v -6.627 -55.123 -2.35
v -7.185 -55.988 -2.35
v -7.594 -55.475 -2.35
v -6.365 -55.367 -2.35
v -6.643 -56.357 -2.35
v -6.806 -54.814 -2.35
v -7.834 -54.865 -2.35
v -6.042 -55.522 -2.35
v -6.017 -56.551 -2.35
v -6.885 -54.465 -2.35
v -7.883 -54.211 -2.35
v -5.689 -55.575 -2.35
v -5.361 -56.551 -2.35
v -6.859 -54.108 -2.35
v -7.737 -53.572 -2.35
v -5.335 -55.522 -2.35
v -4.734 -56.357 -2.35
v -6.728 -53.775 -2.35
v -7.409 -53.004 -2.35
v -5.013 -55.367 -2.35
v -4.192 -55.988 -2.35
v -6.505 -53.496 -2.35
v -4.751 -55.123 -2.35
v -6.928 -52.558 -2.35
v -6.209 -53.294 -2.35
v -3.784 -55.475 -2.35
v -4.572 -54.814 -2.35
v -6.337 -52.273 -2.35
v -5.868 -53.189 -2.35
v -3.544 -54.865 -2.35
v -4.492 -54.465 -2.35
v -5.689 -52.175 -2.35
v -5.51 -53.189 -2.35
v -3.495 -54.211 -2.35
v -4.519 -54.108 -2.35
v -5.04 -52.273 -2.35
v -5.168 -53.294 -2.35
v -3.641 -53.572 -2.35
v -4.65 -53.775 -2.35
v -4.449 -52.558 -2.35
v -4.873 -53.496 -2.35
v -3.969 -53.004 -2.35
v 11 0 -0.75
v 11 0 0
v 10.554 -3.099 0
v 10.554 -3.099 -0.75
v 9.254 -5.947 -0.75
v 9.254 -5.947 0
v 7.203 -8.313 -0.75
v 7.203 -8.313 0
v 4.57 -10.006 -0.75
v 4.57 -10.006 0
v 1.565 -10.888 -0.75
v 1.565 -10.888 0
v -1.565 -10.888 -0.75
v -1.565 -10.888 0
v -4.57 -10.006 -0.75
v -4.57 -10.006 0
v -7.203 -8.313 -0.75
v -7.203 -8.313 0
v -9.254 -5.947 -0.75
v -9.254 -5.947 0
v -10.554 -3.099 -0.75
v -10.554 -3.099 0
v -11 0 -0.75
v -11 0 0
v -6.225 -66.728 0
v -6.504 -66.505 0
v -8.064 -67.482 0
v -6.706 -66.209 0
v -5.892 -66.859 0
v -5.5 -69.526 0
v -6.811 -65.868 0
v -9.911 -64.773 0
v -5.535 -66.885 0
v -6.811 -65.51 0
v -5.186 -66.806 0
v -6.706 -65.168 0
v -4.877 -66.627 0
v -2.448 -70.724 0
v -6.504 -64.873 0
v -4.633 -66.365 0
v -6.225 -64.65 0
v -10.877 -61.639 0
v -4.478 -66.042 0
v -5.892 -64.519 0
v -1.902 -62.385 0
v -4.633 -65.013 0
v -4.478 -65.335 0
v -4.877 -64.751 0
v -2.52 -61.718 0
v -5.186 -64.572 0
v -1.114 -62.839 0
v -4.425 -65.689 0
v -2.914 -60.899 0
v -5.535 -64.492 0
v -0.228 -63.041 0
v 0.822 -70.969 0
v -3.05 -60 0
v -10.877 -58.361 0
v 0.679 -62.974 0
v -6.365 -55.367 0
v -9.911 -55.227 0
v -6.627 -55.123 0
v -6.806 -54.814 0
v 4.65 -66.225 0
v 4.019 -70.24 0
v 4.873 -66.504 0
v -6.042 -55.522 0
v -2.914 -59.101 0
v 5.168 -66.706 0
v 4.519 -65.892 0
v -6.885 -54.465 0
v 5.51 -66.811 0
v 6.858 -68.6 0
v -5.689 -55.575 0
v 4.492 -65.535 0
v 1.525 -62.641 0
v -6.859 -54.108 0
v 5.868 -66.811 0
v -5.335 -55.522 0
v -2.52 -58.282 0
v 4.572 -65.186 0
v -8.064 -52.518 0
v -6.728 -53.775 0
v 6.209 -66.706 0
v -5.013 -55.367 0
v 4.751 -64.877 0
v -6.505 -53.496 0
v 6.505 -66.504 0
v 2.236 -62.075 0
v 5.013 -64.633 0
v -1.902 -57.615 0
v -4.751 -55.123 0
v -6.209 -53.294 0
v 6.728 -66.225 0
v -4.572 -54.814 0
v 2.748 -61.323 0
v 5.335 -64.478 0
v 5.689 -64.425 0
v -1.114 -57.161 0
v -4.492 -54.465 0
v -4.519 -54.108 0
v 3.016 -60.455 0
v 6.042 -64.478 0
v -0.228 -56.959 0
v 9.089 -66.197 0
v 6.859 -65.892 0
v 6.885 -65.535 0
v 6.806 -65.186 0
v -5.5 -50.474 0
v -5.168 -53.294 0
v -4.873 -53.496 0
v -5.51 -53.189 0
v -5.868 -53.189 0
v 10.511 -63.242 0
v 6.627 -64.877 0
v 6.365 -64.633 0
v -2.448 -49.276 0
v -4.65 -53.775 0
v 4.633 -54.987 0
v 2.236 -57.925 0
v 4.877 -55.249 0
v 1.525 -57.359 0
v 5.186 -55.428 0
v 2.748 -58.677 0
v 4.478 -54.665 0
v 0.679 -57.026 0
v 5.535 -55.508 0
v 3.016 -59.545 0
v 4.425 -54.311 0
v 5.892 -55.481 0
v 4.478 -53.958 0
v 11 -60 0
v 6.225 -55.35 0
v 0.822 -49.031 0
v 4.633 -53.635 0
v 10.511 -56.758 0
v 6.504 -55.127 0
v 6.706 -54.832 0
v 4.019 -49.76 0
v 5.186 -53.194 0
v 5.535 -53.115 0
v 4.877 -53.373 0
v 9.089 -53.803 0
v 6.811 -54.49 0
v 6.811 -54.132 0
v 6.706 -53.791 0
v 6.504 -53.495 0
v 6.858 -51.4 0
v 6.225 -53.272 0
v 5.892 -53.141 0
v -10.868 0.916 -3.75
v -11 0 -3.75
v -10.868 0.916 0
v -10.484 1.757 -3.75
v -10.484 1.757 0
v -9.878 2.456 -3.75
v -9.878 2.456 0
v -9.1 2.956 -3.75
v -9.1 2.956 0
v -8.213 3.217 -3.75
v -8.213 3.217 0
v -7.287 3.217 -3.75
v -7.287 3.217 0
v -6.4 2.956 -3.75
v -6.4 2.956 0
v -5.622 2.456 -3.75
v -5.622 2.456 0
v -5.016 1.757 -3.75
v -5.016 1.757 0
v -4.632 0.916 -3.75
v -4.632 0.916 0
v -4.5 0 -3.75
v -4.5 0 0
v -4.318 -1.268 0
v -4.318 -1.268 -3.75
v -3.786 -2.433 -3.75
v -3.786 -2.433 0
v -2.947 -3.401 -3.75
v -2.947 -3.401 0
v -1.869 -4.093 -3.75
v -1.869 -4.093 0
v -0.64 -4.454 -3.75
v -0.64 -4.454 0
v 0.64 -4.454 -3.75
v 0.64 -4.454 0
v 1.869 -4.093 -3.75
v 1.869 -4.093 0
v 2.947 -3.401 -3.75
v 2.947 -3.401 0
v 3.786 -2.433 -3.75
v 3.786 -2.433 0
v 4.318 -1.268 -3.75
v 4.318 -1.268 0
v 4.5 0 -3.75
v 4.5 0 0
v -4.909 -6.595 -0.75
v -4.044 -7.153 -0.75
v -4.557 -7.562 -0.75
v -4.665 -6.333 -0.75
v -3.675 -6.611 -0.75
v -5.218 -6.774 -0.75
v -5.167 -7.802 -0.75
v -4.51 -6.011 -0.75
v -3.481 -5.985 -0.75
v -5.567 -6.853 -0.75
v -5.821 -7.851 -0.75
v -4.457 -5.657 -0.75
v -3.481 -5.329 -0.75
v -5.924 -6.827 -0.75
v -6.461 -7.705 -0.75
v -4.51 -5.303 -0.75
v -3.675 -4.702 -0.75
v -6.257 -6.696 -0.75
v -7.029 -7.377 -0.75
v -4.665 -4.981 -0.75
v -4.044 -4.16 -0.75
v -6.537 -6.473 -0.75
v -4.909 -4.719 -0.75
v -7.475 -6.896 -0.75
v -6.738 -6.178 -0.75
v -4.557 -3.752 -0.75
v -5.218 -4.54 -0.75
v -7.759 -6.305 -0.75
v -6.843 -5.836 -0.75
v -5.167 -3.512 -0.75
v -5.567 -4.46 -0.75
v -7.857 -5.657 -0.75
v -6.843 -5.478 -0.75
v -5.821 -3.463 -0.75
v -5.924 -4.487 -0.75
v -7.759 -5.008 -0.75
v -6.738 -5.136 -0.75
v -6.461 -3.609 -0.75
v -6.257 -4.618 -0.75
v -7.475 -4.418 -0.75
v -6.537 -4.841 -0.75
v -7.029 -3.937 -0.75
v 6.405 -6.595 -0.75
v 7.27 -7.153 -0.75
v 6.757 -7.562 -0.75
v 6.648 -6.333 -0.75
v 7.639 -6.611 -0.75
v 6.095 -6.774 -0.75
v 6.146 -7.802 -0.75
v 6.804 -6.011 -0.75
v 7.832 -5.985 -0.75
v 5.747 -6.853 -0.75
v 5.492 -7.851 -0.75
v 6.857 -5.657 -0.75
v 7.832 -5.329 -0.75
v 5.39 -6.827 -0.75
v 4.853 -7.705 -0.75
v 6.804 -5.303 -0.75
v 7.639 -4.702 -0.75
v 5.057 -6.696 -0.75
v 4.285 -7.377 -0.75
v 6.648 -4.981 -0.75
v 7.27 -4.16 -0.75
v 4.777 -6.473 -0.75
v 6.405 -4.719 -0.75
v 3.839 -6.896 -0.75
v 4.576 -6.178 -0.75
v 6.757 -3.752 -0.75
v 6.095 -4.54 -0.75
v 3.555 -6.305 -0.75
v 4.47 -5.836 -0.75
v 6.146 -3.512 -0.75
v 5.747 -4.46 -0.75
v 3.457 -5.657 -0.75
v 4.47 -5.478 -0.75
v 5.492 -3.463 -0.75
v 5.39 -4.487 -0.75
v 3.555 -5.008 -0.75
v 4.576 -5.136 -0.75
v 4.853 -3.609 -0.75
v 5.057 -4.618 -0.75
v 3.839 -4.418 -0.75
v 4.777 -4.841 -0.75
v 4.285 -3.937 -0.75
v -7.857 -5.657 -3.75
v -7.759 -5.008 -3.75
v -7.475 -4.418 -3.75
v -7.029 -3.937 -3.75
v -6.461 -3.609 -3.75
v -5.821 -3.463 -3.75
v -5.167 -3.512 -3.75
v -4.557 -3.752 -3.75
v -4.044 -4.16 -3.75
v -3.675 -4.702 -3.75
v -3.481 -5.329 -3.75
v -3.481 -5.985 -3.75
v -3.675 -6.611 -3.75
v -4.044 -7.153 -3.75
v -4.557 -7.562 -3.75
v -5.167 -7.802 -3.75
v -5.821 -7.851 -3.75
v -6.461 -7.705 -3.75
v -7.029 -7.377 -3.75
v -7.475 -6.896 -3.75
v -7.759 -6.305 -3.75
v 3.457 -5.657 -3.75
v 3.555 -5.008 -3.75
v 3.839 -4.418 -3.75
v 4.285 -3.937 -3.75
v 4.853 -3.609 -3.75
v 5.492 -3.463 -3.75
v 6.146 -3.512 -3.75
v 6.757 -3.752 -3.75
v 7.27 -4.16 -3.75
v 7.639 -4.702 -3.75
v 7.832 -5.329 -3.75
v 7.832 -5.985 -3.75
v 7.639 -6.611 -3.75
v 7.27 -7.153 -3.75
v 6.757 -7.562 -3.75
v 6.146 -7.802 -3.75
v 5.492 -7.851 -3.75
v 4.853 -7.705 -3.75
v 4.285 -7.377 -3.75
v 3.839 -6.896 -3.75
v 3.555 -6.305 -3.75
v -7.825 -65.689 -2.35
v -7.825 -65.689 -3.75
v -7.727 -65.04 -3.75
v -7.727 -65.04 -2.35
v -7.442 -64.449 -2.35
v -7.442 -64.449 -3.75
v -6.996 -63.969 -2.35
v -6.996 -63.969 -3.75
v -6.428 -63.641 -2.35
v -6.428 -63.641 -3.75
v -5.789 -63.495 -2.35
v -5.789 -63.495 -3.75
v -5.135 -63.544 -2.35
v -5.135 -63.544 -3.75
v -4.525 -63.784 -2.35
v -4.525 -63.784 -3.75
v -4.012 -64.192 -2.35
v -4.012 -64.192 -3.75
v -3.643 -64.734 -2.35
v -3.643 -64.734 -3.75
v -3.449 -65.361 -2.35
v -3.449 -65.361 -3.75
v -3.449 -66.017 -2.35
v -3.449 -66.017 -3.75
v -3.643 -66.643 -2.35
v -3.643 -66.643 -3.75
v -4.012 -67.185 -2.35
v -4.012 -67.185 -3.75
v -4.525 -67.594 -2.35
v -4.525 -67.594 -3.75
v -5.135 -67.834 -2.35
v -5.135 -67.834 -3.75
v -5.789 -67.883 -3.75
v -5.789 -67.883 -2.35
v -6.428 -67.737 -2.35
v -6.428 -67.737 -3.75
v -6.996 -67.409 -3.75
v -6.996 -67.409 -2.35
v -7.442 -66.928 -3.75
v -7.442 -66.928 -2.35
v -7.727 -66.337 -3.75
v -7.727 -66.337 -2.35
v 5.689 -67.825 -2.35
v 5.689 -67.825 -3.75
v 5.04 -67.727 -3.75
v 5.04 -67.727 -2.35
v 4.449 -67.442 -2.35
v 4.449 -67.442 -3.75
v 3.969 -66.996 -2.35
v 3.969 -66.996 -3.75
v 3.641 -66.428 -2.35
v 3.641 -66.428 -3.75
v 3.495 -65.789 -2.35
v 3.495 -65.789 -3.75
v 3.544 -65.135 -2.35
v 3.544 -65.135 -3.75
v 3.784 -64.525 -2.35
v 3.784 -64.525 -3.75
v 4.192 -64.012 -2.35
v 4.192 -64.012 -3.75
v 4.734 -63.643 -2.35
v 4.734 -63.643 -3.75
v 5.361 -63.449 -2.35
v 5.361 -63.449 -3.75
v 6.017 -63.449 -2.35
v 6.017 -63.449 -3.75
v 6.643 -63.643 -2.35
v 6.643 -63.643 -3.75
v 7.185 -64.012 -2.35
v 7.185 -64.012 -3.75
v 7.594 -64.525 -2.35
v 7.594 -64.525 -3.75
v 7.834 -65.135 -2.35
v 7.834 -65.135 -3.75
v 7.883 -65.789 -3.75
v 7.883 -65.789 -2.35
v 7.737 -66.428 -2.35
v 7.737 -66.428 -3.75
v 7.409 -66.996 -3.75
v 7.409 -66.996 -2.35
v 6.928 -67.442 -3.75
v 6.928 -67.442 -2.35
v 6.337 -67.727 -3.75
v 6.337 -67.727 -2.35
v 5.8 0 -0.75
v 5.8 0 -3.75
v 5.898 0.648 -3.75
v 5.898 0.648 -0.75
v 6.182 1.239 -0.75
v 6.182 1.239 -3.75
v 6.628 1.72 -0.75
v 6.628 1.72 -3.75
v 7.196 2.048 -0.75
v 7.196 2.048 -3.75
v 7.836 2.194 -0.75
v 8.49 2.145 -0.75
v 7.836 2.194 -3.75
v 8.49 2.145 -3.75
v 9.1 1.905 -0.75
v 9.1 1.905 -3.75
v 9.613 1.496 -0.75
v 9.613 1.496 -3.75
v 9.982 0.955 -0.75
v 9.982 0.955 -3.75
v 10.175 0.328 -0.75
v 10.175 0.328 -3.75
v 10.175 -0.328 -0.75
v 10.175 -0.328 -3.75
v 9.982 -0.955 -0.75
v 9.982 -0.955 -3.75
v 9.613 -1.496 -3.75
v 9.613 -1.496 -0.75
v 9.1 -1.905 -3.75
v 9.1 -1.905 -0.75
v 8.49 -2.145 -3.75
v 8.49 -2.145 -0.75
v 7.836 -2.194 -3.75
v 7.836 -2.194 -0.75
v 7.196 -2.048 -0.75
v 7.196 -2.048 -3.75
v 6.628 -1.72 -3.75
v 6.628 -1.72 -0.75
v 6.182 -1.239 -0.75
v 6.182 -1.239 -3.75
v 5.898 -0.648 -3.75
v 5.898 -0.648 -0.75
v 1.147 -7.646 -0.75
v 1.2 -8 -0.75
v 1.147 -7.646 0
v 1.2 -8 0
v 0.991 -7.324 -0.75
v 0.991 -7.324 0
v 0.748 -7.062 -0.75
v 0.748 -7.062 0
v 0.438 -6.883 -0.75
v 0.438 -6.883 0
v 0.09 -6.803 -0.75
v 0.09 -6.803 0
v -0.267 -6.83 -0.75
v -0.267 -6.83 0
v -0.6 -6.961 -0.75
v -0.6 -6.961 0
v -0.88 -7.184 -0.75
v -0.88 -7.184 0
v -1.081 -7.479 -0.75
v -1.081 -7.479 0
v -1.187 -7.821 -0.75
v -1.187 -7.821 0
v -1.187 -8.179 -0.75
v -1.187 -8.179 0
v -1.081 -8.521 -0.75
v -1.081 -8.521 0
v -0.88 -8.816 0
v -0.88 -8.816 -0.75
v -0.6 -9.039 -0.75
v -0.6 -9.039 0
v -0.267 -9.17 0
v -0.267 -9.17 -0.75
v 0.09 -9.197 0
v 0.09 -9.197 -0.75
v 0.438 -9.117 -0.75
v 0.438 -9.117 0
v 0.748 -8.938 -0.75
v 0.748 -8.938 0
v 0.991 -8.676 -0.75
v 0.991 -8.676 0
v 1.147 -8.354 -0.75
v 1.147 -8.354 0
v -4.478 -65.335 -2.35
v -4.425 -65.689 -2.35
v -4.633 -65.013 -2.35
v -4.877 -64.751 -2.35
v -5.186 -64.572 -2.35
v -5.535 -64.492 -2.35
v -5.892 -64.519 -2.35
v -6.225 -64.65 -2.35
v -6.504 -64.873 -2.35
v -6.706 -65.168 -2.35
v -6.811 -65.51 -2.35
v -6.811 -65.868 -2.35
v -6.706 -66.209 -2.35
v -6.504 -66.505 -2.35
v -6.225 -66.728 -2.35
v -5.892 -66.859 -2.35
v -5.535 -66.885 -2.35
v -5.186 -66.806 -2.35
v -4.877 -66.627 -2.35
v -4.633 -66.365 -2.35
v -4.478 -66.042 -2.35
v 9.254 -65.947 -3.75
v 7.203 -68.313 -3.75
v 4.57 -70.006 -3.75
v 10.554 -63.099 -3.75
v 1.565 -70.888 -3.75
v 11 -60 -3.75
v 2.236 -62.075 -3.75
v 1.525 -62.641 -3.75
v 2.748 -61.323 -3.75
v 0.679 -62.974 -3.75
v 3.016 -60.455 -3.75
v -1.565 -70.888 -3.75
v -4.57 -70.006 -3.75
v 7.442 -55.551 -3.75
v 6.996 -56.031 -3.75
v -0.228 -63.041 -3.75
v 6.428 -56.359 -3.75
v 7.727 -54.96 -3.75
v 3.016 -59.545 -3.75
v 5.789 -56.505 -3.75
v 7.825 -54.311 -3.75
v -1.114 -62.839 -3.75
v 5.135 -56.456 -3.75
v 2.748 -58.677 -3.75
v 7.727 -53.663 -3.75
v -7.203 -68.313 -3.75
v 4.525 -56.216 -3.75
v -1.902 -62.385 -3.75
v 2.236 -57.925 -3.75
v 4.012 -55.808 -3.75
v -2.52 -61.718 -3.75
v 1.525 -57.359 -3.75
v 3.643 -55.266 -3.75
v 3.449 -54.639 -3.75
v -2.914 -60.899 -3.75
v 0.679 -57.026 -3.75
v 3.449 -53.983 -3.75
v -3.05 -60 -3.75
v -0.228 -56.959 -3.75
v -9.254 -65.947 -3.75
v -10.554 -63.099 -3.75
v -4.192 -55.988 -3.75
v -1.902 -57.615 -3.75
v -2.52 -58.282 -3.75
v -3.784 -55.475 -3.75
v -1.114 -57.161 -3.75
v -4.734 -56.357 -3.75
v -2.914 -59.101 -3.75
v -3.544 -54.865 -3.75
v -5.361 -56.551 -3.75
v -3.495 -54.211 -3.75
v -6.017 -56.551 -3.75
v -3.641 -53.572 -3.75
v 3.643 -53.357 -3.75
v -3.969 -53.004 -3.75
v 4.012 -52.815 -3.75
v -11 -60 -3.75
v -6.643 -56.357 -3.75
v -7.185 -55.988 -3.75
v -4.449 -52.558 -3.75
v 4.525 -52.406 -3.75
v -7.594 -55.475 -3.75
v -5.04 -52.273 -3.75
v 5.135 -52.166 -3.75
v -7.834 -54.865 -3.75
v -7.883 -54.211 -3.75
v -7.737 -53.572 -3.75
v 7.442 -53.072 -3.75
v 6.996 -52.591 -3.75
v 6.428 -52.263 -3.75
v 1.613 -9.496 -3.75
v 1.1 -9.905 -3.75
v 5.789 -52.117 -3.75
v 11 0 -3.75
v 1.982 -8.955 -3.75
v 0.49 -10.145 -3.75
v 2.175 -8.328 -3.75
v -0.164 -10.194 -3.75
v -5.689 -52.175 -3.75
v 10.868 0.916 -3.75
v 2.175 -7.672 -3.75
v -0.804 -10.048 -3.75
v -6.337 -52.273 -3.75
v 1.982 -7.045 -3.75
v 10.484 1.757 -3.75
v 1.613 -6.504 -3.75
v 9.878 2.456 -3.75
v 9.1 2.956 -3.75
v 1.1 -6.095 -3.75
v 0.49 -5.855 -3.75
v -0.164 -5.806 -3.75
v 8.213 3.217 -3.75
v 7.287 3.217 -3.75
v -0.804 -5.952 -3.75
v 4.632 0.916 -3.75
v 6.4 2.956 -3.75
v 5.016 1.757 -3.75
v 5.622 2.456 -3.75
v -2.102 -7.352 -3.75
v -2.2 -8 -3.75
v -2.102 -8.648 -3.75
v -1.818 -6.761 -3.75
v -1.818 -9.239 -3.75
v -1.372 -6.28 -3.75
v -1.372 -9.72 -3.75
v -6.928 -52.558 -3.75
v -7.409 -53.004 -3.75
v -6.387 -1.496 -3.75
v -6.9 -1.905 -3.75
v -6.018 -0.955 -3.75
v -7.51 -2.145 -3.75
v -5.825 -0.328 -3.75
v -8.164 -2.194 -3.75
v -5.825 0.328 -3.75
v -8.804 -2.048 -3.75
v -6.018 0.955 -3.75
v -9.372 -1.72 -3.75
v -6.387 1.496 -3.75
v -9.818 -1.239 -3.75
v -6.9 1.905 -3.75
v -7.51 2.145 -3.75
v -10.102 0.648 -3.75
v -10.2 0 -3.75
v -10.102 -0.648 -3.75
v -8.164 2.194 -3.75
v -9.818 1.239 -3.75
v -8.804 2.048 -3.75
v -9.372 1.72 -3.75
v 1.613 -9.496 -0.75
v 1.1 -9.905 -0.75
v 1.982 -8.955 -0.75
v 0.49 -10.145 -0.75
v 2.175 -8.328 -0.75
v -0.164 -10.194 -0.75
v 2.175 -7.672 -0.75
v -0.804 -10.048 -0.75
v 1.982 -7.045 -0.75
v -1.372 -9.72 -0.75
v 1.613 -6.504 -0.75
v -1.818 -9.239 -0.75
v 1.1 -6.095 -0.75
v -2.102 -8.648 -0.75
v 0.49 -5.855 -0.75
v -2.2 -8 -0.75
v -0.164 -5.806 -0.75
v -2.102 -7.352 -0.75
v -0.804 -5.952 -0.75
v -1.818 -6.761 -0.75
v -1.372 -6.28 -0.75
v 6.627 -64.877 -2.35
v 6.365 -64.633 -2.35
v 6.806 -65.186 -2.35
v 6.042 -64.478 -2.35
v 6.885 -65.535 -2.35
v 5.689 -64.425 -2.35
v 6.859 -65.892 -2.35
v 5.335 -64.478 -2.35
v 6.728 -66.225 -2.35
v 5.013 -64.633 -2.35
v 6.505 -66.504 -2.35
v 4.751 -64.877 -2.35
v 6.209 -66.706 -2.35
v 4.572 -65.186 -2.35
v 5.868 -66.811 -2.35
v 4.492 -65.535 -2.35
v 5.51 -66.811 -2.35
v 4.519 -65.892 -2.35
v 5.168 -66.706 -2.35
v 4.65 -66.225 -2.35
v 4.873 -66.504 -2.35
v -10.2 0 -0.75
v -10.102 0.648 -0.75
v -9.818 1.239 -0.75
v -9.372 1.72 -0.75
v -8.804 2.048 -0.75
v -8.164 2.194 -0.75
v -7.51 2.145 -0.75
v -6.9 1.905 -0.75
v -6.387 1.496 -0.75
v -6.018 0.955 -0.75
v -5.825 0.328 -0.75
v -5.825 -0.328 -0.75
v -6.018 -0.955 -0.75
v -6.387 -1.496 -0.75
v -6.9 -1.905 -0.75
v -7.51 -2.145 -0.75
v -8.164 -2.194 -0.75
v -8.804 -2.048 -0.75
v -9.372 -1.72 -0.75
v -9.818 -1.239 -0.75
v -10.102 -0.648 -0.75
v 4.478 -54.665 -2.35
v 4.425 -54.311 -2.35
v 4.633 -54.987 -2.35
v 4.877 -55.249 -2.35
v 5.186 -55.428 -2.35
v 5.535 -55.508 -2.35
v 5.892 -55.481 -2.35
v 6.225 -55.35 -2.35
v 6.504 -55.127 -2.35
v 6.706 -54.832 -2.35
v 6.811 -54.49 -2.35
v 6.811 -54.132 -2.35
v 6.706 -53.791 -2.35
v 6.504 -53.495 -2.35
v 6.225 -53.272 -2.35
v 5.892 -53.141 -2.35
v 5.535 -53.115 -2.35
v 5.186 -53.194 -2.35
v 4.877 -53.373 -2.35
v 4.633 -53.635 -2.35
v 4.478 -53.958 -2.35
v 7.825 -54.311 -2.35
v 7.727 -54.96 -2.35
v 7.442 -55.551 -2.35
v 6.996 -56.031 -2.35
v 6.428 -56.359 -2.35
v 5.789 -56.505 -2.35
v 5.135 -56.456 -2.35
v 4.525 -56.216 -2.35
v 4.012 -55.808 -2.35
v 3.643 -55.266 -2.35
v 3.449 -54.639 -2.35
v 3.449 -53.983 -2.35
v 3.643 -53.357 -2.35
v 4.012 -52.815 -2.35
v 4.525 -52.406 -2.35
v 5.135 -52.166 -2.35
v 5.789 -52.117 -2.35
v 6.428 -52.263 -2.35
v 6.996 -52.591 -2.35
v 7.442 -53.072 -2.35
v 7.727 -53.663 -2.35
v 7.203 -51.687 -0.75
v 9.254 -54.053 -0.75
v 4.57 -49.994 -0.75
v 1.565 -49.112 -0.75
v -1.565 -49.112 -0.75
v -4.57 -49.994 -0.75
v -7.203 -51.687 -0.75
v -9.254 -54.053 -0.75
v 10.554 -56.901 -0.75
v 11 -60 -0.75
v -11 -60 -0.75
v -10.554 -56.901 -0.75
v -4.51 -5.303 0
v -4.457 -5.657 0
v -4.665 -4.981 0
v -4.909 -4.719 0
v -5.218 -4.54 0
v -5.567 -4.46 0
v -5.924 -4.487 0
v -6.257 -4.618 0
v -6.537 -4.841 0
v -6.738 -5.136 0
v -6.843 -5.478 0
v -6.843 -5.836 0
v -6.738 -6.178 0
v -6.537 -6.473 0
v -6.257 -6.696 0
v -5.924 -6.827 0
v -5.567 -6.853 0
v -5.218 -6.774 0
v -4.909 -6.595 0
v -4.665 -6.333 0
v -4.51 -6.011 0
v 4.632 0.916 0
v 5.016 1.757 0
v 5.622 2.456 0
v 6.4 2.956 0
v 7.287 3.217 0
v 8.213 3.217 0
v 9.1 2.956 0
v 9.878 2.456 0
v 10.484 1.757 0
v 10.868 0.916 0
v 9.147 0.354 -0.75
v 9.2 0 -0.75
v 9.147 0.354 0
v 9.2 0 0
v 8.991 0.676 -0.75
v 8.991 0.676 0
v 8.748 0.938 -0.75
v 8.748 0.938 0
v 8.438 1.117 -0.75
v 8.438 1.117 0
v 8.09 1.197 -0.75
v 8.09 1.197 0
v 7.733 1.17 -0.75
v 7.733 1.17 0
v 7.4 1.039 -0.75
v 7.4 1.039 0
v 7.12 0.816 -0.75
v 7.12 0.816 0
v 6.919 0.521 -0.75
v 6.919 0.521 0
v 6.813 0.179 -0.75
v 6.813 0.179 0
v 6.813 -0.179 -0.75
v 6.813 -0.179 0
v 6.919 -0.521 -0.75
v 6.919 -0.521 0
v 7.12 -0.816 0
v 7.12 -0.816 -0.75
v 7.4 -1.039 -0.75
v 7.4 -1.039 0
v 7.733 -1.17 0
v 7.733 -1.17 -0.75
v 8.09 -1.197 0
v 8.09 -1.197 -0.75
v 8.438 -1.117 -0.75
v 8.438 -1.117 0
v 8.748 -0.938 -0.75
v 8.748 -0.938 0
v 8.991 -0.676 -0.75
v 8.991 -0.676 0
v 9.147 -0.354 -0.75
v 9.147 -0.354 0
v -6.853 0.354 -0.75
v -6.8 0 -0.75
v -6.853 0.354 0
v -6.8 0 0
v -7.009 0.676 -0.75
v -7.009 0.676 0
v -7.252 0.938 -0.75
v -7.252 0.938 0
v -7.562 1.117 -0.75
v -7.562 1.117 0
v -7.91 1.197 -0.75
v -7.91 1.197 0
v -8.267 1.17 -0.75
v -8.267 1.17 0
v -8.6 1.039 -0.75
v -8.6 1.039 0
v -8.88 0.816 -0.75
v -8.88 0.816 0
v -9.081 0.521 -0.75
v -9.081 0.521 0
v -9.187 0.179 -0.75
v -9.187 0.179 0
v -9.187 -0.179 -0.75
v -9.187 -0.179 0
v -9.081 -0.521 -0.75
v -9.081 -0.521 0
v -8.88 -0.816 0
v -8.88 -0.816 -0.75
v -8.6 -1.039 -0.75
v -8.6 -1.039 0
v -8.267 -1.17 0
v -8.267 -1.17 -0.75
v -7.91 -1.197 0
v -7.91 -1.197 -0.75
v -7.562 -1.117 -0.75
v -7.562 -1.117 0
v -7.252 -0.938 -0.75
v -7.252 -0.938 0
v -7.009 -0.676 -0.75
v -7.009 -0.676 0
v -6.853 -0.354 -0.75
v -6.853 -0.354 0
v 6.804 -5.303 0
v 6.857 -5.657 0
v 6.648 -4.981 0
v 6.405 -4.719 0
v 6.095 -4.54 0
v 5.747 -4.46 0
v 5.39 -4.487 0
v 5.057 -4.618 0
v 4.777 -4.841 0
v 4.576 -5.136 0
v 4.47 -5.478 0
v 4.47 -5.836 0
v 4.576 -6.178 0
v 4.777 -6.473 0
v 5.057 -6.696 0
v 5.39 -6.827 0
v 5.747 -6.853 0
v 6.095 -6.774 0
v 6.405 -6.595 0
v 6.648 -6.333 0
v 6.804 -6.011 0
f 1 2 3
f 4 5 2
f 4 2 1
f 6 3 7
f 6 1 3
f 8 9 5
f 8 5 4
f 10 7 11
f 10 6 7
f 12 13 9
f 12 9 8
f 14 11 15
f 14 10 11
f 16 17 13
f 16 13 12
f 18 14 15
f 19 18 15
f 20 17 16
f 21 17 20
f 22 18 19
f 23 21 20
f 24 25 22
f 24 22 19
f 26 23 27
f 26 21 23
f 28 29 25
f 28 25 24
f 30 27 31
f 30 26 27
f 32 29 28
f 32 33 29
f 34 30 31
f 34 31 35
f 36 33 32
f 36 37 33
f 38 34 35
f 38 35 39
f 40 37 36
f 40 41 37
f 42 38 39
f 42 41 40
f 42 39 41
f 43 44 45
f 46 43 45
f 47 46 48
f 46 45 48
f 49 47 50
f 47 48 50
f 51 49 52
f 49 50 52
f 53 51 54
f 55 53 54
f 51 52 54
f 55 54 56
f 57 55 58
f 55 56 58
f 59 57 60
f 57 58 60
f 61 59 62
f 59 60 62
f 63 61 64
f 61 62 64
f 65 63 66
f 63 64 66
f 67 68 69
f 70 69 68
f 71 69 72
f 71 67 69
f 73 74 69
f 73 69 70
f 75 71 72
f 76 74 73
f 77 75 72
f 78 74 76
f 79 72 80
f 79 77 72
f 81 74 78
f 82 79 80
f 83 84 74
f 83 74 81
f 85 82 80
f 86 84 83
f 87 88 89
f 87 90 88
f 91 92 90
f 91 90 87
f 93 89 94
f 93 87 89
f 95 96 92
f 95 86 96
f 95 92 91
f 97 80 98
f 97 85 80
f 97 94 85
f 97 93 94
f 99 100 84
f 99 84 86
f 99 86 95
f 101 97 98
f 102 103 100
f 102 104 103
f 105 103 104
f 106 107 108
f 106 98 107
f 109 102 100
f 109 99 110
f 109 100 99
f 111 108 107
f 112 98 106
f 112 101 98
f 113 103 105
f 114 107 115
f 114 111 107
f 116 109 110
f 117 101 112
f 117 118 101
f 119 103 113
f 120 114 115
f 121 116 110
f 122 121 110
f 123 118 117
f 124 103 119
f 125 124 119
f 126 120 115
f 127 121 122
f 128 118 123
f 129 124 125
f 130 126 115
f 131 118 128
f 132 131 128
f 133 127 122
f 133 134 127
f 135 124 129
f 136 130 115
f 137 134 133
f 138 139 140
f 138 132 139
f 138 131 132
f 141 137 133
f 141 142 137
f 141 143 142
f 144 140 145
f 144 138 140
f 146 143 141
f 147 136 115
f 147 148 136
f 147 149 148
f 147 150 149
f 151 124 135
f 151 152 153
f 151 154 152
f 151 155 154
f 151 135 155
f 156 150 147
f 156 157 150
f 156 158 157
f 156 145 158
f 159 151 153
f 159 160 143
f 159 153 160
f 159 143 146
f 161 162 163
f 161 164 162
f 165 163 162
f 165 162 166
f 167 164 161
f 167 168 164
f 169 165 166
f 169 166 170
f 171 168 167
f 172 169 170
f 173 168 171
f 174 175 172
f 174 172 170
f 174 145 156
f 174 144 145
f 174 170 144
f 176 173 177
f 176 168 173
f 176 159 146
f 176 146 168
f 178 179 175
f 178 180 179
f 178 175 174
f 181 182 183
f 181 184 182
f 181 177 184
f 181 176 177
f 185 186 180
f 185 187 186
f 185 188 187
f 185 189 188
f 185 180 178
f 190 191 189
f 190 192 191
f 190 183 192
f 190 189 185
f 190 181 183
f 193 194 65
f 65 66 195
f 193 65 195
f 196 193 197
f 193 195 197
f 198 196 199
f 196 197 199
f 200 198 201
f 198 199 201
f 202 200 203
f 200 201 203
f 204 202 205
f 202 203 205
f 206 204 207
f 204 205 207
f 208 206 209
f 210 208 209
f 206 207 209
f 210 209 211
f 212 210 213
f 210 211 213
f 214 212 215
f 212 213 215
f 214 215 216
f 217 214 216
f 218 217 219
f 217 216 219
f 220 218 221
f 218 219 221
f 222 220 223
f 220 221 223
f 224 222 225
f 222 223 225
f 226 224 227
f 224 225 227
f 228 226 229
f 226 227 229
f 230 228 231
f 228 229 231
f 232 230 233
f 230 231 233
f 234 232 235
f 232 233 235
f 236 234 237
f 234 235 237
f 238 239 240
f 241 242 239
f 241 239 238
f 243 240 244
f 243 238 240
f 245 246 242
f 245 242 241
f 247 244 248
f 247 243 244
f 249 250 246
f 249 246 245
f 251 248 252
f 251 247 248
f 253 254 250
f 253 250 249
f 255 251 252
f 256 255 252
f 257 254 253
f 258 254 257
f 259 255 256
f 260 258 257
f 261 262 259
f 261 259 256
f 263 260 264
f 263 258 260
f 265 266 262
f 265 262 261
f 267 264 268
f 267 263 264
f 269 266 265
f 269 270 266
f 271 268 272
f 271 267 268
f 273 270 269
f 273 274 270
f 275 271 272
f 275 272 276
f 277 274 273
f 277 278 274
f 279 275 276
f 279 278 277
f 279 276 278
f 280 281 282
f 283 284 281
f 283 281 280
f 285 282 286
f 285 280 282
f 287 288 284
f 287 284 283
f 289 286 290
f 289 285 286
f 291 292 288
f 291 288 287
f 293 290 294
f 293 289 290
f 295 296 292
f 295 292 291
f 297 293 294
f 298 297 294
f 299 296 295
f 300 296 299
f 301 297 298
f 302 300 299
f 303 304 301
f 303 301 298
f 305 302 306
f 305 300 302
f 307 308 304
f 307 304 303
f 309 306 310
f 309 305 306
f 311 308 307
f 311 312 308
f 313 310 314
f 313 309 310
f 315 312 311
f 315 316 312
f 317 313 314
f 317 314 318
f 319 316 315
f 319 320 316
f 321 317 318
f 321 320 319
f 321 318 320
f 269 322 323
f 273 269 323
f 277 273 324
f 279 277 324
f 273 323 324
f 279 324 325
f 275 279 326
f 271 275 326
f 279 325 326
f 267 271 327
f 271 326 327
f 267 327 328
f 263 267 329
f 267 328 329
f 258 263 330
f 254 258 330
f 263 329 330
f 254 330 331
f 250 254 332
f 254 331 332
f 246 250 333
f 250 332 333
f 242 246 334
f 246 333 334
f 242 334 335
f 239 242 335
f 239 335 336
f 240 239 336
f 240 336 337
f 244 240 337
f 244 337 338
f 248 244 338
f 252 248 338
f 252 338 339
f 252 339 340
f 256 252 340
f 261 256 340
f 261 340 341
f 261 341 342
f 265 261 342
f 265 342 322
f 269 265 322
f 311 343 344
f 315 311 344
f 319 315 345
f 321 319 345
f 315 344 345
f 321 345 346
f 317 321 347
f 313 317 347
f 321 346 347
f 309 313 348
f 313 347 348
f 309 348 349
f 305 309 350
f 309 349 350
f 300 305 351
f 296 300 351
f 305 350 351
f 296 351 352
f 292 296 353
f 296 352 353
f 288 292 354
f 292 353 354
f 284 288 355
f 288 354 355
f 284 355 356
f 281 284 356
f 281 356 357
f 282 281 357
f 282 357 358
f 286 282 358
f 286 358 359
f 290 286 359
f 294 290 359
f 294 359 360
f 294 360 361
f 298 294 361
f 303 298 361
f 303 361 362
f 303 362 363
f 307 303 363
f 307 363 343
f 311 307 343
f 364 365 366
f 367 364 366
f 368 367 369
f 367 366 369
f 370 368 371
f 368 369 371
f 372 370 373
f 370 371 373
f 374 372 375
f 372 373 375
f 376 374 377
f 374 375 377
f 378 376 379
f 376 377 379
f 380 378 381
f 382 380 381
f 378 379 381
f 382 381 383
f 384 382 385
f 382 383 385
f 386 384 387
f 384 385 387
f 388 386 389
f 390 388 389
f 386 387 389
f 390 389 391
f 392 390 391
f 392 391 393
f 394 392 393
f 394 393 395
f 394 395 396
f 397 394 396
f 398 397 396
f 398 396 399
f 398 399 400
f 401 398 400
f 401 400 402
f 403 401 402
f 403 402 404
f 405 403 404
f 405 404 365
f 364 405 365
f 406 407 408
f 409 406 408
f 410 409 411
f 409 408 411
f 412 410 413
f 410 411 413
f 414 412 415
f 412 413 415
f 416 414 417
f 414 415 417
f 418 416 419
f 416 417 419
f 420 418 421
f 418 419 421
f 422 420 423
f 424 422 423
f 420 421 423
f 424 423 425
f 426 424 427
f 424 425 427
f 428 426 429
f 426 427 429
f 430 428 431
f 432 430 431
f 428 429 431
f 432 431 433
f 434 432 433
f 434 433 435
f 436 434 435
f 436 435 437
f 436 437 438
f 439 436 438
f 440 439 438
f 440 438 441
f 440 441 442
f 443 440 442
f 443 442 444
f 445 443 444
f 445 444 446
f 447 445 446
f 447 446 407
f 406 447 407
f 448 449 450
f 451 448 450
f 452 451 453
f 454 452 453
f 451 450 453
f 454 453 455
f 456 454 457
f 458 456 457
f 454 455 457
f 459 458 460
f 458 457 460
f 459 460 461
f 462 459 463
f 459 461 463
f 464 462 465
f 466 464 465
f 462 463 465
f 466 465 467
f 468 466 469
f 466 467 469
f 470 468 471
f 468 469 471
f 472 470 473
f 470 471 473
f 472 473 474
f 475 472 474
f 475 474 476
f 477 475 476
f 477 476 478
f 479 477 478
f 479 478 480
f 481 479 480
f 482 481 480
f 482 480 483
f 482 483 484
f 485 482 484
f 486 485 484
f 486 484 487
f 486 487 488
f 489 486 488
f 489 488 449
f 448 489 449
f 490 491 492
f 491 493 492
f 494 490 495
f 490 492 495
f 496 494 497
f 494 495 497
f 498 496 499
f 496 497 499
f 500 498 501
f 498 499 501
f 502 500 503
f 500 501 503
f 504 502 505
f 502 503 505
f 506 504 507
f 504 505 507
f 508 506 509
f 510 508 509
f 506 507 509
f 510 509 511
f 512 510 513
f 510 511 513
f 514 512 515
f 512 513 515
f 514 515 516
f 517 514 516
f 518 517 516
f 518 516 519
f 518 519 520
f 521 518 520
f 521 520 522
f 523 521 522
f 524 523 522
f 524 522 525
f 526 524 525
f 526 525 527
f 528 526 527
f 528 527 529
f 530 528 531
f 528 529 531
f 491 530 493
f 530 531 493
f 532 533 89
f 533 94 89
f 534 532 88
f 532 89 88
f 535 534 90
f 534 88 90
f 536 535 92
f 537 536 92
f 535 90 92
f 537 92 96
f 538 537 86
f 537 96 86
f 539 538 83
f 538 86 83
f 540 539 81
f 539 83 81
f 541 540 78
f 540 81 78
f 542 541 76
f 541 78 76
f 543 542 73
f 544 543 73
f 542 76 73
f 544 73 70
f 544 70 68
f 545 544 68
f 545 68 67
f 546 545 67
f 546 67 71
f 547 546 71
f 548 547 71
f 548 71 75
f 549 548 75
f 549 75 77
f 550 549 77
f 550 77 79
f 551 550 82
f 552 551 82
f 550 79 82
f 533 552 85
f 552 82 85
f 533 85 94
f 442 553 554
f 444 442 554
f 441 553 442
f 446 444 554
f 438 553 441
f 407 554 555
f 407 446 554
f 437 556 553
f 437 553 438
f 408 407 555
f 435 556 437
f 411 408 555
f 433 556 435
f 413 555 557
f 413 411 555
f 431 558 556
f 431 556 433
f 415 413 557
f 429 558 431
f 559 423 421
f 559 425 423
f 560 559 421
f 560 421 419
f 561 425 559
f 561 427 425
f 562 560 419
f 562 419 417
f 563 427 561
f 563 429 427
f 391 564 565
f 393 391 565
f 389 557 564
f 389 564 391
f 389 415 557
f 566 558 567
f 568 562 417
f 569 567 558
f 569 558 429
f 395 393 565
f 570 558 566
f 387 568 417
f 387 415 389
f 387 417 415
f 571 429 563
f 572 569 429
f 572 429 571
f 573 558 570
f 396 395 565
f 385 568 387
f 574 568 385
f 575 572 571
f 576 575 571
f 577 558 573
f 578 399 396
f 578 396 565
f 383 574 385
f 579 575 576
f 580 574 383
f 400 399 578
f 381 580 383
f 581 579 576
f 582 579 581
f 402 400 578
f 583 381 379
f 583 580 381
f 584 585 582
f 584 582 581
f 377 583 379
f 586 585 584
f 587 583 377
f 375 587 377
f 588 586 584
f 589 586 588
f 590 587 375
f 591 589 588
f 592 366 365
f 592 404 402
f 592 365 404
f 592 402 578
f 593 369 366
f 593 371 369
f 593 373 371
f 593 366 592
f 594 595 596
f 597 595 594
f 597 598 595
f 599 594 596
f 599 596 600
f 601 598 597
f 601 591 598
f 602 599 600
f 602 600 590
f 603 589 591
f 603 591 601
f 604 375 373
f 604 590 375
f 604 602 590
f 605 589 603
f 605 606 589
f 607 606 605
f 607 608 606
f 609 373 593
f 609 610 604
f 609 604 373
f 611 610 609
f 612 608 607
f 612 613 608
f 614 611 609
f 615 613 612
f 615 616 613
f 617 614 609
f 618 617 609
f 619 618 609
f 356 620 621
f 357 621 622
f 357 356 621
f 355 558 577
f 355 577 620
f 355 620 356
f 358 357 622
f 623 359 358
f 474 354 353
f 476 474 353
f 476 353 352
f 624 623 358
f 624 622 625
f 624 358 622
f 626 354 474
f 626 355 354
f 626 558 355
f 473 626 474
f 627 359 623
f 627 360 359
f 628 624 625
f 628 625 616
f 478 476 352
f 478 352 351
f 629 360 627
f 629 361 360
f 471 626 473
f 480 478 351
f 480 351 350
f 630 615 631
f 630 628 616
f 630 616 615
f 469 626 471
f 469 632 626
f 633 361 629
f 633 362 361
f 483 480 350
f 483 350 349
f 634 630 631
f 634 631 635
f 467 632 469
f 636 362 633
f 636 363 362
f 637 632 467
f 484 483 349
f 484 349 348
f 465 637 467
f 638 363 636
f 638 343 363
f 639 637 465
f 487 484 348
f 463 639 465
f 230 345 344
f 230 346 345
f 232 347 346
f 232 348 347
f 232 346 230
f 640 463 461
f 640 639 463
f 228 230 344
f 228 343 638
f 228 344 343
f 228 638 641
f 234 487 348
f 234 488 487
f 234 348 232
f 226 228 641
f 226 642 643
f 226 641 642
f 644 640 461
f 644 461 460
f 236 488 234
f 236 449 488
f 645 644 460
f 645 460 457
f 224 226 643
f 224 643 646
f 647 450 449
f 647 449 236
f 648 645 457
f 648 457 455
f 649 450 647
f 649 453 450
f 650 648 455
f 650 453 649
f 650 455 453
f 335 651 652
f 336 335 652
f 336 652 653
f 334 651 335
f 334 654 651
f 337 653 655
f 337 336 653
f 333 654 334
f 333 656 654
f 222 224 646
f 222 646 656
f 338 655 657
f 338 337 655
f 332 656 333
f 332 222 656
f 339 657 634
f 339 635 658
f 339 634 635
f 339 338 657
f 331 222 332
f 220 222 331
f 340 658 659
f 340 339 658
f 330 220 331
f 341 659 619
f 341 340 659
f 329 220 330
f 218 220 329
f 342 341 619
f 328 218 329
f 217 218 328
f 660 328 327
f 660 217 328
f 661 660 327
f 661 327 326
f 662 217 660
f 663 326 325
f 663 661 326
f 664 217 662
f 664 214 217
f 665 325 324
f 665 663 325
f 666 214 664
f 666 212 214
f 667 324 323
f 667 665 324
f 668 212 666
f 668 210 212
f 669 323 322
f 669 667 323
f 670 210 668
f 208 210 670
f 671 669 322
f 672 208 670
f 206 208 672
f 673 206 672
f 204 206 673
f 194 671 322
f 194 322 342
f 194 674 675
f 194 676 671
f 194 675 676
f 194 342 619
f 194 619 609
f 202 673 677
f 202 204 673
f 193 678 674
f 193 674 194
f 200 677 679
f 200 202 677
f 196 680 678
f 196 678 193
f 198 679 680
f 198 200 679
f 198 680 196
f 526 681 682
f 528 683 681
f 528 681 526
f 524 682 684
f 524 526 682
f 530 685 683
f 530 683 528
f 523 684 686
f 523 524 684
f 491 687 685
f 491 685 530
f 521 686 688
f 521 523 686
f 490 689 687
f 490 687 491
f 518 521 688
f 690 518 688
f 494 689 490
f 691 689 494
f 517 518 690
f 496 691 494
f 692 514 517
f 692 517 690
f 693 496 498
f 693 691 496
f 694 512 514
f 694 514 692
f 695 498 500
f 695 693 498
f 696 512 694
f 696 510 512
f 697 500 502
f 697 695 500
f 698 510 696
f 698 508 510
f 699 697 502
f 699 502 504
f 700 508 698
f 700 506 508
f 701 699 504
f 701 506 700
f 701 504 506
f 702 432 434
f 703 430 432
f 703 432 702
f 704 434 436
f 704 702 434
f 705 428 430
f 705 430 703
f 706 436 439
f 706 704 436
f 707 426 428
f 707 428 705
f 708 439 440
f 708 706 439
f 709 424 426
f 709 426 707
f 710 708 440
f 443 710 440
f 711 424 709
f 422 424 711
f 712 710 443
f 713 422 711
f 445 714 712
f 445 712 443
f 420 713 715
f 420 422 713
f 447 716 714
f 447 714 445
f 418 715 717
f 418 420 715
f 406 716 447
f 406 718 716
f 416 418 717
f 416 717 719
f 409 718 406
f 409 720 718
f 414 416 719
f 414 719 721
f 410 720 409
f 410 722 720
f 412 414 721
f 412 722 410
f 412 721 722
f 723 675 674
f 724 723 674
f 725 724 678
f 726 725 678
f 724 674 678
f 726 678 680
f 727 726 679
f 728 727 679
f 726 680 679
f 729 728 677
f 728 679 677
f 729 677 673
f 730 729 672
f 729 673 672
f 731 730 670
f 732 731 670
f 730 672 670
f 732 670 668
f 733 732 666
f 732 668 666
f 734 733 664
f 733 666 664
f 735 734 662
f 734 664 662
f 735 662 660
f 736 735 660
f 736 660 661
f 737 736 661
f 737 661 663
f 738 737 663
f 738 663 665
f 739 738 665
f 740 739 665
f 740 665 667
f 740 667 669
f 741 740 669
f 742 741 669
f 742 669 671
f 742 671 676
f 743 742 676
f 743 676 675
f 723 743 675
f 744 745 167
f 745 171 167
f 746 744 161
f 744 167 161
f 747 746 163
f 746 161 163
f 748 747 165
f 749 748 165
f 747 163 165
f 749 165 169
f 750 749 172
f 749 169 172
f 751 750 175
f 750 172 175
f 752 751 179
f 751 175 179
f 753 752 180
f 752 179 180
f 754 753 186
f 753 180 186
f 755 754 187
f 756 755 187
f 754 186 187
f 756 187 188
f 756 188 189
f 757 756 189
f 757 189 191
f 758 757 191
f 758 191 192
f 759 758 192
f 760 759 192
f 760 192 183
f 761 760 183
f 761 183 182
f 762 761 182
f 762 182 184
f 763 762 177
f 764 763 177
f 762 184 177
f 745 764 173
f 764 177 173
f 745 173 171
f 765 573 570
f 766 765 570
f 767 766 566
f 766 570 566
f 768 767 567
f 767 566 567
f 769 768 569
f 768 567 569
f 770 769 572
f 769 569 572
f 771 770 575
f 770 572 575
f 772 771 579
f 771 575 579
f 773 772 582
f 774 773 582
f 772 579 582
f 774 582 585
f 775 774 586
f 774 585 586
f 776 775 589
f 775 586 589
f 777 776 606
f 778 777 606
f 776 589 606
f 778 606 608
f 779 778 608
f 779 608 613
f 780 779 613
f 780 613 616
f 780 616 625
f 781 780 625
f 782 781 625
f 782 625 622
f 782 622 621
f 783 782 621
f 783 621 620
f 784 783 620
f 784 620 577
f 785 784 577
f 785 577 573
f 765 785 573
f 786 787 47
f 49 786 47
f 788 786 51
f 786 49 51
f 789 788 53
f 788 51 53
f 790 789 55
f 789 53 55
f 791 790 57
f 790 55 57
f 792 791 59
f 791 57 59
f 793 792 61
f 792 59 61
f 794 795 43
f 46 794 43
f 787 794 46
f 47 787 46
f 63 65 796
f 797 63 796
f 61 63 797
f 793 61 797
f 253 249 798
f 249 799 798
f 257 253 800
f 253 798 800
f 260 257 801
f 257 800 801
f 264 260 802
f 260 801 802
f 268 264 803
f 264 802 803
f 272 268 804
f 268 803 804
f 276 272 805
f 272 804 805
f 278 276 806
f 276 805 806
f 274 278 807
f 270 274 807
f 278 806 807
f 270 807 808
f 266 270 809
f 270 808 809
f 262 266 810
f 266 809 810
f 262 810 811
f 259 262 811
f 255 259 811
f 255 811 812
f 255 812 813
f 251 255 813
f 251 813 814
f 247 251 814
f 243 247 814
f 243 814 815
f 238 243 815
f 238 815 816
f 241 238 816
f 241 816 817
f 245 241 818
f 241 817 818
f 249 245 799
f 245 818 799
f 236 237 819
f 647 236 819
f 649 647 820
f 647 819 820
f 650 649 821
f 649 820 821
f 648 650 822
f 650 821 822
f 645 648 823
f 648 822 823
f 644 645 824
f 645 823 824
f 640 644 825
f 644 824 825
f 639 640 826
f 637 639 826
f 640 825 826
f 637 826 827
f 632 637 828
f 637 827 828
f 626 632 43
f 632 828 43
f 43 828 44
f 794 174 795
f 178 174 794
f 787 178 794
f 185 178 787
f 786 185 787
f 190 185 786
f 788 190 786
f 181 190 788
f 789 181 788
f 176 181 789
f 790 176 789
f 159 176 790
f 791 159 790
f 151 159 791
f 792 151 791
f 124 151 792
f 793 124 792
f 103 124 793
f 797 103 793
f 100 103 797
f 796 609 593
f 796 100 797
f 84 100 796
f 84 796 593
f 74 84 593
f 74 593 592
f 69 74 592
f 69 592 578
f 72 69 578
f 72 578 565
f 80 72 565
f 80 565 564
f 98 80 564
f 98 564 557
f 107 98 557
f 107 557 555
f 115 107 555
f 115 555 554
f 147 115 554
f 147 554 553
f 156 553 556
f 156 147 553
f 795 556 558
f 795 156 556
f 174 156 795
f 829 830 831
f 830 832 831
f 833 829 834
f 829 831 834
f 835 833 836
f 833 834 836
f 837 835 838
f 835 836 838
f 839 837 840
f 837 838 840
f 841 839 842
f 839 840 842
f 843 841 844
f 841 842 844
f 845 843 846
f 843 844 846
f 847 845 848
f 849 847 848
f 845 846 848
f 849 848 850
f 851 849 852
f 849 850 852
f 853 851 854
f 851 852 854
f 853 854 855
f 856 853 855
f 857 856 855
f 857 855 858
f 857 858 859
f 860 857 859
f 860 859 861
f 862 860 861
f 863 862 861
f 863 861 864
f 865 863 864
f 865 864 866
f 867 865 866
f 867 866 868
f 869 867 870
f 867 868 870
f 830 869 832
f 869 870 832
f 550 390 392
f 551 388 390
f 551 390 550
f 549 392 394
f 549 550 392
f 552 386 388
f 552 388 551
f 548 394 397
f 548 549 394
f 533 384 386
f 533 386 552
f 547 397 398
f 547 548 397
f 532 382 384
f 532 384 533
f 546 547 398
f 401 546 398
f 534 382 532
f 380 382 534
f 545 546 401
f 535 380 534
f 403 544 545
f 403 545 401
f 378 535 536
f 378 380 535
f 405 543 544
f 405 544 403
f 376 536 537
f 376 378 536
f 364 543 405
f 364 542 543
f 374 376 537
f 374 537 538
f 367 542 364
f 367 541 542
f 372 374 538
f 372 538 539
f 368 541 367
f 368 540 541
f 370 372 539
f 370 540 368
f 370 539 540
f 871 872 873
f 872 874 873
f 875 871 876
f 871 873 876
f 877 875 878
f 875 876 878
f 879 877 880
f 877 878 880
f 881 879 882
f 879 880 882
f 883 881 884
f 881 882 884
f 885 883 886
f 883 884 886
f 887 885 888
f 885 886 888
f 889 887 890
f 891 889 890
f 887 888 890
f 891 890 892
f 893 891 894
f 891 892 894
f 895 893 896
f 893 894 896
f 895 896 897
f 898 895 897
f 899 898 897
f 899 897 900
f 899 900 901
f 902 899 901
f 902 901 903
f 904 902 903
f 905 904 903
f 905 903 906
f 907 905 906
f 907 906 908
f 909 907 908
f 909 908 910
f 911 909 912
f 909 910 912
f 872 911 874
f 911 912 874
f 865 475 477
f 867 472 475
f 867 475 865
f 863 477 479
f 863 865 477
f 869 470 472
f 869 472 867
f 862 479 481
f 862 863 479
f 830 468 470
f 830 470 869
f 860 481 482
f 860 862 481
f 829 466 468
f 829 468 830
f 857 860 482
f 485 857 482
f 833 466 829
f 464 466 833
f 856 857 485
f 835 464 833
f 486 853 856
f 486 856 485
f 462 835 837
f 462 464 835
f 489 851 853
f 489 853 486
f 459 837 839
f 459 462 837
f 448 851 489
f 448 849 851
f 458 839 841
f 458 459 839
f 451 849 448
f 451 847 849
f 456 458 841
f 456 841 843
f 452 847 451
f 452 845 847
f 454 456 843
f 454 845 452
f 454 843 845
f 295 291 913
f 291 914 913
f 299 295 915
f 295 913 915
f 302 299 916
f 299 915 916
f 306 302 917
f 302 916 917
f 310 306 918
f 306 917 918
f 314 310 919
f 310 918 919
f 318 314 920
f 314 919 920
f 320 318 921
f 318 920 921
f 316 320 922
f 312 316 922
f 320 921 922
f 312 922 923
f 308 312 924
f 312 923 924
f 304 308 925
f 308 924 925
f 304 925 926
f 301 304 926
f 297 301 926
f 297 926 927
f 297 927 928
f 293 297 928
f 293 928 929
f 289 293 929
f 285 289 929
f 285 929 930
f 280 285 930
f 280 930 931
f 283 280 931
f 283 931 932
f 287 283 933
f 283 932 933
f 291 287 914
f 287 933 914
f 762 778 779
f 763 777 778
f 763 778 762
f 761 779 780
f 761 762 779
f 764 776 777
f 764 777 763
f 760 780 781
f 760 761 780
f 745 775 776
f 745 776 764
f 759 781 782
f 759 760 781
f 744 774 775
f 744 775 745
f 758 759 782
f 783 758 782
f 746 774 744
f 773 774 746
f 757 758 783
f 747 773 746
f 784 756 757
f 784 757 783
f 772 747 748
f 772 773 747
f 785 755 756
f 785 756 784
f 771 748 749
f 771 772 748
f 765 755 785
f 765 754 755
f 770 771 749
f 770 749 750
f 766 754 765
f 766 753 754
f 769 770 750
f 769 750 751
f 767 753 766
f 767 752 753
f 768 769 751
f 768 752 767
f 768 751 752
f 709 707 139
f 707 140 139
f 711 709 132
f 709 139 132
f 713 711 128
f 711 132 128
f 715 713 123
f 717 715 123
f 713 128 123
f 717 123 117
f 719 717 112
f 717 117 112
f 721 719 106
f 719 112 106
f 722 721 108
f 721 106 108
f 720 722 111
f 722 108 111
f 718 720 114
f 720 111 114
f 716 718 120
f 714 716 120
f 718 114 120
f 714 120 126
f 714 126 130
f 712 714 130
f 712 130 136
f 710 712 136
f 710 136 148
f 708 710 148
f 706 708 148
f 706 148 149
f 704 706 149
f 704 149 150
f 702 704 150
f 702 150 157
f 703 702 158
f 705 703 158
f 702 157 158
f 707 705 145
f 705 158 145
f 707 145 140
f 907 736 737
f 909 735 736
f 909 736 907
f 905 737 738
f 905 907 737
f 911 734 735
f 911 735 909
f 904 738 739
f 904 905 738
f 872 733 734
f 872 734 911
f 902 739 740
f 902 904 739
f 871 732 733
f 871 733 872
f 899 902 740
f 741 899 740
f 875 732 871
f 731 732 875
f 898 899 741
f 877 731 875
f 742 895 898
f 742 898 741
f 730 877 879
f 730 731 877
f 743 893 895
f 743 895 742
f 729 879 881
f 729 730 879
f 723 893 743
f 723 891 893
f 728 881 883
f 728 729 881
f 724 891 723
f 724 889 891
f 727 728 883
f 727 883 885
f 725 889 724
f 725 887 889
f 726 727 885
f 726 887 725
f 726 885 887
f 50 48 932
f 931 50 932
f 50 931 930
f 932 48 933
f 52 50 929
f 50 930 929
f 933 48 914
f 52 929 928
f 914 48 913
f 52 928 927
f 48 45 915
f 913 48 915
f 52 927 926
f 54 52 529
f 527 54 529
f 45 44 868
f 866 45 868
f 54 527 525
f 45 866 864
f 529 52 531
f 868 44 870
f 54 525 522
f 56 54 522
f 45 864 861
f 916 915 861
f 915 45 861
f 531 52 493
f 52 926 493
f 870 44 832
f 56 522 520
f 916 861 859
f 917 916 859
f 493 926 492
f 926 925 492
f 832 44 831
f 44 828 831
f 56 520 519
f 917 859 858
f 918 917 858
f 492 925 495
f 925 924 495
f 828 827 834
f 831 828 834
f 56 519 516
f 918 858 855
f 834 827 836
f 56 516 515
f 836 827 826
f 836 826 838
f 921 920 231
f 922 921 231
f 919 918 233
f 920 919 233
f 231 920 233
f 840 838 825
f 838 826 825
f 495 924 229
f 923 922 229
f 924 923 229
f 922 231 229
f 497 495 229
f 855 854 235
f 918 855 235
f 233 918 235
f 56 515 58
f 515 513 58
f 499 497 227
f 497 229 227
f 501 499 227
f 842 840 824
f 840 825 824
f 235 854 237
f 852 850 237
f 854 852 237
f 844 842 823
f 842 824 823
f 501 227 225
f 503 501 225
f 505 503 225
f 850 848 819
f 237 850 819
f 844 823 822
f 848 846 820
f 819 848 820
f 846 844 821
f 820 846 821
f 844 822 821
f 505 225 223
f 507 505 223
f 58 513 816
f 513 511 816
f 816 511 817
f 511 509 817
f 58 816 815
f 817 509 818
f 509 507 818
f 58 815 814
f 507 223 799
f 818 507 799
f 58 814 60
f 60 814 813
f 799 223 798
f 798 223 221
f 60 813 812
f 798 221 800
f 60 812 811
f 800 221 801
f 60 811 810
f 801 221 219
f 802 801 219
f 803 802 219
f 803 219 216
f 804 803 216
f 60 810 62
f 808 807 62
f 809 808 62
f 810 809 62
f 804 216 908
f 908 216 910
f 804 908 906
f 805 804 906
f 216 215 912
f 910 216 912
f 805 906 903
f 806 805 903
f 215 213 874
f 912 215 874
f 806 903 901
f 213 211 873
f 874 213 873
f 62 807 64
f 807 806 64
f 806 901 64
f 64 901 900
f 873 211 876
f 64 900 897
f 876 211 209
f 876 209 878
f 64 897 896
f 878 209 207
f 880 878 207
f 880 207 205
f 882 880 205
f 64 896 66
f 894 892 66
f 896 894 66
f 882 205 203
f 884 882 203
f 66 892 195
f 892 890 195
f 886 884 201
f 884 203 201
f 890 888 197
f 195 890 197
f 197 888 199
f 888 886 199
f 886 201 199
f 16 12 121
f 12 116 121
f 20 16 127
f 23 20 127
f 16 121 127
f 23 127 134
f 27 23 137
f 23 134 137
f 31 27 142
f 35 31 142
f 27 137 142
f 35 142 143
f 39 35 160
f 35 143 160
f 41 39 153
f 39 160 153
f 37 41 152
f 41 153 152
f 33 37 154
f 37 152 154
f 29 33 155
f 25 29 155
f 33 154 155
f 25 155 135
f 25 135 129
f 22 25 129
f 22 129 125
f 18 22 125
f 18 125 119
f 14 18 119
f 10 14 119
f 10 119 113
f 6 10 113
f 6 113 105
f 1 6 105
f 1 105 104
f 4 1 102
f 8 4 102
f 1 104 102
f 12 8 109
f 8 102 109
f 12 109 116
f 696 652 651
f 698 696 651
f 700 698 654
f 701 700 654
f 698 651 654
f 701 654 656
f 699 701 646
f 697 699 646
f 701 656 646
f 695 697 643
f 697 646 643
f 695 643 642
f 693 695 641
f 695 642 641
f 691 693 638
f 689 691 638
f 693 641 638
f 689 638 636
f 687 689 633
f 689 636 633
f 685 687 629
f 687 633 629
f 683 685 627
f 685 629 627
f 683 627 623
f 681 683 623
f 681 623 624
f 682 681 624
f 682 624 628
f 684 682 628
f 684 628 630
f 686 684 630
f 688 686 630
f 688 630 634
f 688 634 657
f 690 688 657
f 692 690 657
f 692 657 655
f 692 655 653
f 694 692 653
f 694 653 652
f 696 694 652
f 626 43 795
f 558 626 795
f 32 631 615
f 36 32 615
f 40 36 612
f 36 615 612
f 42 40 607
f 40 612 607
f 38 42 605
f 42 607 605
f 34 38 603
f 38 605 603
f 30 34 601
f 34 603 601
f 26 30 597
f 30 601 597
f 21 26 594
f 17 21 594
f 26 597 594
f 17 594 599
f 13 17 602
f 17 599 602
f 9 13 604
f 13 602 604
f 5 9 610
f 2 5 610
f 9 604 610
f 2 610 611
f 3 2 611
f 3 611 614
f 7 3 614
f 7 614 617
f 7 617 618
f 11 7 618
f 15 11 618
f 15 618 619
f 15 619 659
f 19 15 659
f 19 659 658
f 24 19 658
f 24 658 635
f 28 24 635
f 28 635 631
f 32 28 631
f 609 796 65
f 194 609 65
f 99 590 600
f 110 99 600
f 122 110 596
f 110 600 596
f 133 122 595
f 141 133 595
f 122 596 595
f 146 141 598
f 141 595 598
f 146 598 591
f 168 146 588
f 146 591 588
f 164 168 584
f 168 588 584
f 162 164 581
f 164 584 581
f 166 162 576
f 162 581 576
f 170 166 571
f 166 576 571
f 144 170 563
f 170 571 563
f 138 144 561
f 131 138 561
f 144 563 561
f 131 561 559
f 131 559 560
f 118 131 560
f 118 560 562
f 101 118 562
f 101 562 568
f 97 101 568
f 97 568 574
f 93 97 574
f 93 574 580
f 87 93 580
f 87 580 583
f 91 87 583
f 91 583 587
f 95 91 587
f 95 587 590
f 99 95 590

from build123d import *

# Parameters (mm, degrees)
RESSALTO_EXTRUS_O1_DEPTH                             = 0.75
RESSALTO_EXTRUS_O2_DEPTH                             = 3
REBAIXO_PARA_SHCS_M21_D                              = 2.4
REBAIXO_PARA_SHCS_M21_CBORE_D                        = 4.4
REBAIXO_PARA_SHCS_M21_CBORE_DEPTH                    = 3
RESSALTO_EXTRUS_O3_START                             = 0.75
ESBO_O4_R                                            = 11
RESSALTO_EXTRUS_O3_DEPTH                             = 0.75
ESBO_O5_R                                            = 3.05
CORTE_EXTRUS_O1_DEPTH                                = 72.944857356
REBAIXO_PARA_PARAFUSO_COM_CABE_A_REDONDA_D           = 2.4
REBAIXO_PARA_PARAFUSO_COM_CABE_A_REDONDA_CBORE_D     = 4.4
REBAIXO_PARA_PARAFUSO_COM_CABE_A_REDONDA_CBORE_DEPTH = 1.4
PADR_OCIRCULAR1_COUNT                                = 4


with BuildPart() as part:
    # Esboço1 → Ressalto-extrusão1 (new body)
    with BuildSketch(Plane.XY):
        with BuildLine():
            ThreePointArc((-4.5, 0), (0, -4.5), (4.5, 0))
            ThreePointArc((4.5, 0), (7.75, 3.25), (11, 0))
            ThreePointArc((11, 0), (0, -11), (-11, 0))
            ThreePointArc((-11, 0), (-7.75, 3.25), (-4.5, 0))
        make_face()
    extrude(amount=-RESSALTO_EXTRUS_O1_DEPTH)

    # Esboço3 → Ressalto-extrusão2 (add)
    with BuildSketch(Plane(origin=(0, 0, -0.75), x_dir=(-1, 0, 0), z_dir=(0, 0, -1))):
        with BuildLine():
            Line((-11, 0), (-11, -60))
            ThreePointArc((-11, -60), (0, -71), (11, -60))
            Line((11, -60), (11, 0))
            ThreePointArc((11, 0), (7.75, 3.25), (4.5, 0))
            ThreePointArc((4.5, 0), (0, -4.5), (-4.5, 0))
            ThreePointArc((-4.5, 0), (-7.75, 3.25), (-11, 0))
        make_face()
    extrude(amount=RESSALTO_EXTRUS_O2_DEPTH)

    # Rebaixo para SHCS M21 (through all)
    with Locations(Plane(origin=(0, 0, -3.75), x_dir=(-1, 0, 0), z_dir=(0, 0, -1))):
        with Locations((-8, 0), (-5.656854249, -5.656854249), (0, -8), (5.656854249, -5.656854249), (8, 0)):
            CounterBoreHole(REBAIXO_PARA_SHCS_M21_D / 2, REBAIXO_PARA_SHCS_M21_CBORE_D / 2, REBAIXO_PARA_SHCS_M21_CBORE_DEPTH)

    # Esboço4 → Ressalto-extrusão3 (add)
    with BuildSketch(Plane.XY.offset(-0.75).offset(RESSALTO_EXTRUS_O3_START)):
        with Locations((0, -60)):
            Circle(ESBO_O4_R)
    extrude(amount=-RESSALTO_EXTRUS_O3_DEPTH)

    # Esboço5 → Corte-extrusão1 (cut, through all)
    with BuildSketch(Plane(origin=(0, 0, -3.75), x_dir=(-1, 0, 0), z_dir=(0, 0, -1))):
        with Locations((0, -60)):
            Circle(ESBO_O5_R)
    extrude(amount=-CORTE_EXTRUS_O1_DEPTH, mode=Mode.SUBTRACT)

    # Rebaixo para parafuso com cabeça redonda de M21 (through all)
    with Locations(Plane(origin=(0, 0, -3.75), x_dir=(-1, 0, 0), z_dir=(0, 0, -1))):
        with Locations((5.624741587, -65.688785642)):
            rebaixo_para_parafuso_com_cabe_a_redonda = CounterBoreHole(REBAIXO_PARA_PARAFUSO_COM_CABE_A_REDONDA_D / 2, REBAIXO_PARA_PARAFUSO_COM_CABE_A_REDONDA_CBORE_D / 2, REBAIXO_PARA_PARAFUSO_COM_CABE_A_REDONDA_CBORE_DEPTH)

    # PadrãoCircular1: Rebaixo para parafuso com cabeça redonda de M21 ×4 about axis
    padr_ocircular1_axis = Axis((0, -60, 0), (0, 0, 1))
    for i in range(1, PADR_OCIRCULAR1_COUNT):
        add(rebaixo_para_parafuso_com_cabe_a_redonda.rotate(padr_ocircular1_axis, i * 360 / PADR_OCIRCULAR1_COUNT), mode=Mode.SUBTRACT)


solid = part.part
